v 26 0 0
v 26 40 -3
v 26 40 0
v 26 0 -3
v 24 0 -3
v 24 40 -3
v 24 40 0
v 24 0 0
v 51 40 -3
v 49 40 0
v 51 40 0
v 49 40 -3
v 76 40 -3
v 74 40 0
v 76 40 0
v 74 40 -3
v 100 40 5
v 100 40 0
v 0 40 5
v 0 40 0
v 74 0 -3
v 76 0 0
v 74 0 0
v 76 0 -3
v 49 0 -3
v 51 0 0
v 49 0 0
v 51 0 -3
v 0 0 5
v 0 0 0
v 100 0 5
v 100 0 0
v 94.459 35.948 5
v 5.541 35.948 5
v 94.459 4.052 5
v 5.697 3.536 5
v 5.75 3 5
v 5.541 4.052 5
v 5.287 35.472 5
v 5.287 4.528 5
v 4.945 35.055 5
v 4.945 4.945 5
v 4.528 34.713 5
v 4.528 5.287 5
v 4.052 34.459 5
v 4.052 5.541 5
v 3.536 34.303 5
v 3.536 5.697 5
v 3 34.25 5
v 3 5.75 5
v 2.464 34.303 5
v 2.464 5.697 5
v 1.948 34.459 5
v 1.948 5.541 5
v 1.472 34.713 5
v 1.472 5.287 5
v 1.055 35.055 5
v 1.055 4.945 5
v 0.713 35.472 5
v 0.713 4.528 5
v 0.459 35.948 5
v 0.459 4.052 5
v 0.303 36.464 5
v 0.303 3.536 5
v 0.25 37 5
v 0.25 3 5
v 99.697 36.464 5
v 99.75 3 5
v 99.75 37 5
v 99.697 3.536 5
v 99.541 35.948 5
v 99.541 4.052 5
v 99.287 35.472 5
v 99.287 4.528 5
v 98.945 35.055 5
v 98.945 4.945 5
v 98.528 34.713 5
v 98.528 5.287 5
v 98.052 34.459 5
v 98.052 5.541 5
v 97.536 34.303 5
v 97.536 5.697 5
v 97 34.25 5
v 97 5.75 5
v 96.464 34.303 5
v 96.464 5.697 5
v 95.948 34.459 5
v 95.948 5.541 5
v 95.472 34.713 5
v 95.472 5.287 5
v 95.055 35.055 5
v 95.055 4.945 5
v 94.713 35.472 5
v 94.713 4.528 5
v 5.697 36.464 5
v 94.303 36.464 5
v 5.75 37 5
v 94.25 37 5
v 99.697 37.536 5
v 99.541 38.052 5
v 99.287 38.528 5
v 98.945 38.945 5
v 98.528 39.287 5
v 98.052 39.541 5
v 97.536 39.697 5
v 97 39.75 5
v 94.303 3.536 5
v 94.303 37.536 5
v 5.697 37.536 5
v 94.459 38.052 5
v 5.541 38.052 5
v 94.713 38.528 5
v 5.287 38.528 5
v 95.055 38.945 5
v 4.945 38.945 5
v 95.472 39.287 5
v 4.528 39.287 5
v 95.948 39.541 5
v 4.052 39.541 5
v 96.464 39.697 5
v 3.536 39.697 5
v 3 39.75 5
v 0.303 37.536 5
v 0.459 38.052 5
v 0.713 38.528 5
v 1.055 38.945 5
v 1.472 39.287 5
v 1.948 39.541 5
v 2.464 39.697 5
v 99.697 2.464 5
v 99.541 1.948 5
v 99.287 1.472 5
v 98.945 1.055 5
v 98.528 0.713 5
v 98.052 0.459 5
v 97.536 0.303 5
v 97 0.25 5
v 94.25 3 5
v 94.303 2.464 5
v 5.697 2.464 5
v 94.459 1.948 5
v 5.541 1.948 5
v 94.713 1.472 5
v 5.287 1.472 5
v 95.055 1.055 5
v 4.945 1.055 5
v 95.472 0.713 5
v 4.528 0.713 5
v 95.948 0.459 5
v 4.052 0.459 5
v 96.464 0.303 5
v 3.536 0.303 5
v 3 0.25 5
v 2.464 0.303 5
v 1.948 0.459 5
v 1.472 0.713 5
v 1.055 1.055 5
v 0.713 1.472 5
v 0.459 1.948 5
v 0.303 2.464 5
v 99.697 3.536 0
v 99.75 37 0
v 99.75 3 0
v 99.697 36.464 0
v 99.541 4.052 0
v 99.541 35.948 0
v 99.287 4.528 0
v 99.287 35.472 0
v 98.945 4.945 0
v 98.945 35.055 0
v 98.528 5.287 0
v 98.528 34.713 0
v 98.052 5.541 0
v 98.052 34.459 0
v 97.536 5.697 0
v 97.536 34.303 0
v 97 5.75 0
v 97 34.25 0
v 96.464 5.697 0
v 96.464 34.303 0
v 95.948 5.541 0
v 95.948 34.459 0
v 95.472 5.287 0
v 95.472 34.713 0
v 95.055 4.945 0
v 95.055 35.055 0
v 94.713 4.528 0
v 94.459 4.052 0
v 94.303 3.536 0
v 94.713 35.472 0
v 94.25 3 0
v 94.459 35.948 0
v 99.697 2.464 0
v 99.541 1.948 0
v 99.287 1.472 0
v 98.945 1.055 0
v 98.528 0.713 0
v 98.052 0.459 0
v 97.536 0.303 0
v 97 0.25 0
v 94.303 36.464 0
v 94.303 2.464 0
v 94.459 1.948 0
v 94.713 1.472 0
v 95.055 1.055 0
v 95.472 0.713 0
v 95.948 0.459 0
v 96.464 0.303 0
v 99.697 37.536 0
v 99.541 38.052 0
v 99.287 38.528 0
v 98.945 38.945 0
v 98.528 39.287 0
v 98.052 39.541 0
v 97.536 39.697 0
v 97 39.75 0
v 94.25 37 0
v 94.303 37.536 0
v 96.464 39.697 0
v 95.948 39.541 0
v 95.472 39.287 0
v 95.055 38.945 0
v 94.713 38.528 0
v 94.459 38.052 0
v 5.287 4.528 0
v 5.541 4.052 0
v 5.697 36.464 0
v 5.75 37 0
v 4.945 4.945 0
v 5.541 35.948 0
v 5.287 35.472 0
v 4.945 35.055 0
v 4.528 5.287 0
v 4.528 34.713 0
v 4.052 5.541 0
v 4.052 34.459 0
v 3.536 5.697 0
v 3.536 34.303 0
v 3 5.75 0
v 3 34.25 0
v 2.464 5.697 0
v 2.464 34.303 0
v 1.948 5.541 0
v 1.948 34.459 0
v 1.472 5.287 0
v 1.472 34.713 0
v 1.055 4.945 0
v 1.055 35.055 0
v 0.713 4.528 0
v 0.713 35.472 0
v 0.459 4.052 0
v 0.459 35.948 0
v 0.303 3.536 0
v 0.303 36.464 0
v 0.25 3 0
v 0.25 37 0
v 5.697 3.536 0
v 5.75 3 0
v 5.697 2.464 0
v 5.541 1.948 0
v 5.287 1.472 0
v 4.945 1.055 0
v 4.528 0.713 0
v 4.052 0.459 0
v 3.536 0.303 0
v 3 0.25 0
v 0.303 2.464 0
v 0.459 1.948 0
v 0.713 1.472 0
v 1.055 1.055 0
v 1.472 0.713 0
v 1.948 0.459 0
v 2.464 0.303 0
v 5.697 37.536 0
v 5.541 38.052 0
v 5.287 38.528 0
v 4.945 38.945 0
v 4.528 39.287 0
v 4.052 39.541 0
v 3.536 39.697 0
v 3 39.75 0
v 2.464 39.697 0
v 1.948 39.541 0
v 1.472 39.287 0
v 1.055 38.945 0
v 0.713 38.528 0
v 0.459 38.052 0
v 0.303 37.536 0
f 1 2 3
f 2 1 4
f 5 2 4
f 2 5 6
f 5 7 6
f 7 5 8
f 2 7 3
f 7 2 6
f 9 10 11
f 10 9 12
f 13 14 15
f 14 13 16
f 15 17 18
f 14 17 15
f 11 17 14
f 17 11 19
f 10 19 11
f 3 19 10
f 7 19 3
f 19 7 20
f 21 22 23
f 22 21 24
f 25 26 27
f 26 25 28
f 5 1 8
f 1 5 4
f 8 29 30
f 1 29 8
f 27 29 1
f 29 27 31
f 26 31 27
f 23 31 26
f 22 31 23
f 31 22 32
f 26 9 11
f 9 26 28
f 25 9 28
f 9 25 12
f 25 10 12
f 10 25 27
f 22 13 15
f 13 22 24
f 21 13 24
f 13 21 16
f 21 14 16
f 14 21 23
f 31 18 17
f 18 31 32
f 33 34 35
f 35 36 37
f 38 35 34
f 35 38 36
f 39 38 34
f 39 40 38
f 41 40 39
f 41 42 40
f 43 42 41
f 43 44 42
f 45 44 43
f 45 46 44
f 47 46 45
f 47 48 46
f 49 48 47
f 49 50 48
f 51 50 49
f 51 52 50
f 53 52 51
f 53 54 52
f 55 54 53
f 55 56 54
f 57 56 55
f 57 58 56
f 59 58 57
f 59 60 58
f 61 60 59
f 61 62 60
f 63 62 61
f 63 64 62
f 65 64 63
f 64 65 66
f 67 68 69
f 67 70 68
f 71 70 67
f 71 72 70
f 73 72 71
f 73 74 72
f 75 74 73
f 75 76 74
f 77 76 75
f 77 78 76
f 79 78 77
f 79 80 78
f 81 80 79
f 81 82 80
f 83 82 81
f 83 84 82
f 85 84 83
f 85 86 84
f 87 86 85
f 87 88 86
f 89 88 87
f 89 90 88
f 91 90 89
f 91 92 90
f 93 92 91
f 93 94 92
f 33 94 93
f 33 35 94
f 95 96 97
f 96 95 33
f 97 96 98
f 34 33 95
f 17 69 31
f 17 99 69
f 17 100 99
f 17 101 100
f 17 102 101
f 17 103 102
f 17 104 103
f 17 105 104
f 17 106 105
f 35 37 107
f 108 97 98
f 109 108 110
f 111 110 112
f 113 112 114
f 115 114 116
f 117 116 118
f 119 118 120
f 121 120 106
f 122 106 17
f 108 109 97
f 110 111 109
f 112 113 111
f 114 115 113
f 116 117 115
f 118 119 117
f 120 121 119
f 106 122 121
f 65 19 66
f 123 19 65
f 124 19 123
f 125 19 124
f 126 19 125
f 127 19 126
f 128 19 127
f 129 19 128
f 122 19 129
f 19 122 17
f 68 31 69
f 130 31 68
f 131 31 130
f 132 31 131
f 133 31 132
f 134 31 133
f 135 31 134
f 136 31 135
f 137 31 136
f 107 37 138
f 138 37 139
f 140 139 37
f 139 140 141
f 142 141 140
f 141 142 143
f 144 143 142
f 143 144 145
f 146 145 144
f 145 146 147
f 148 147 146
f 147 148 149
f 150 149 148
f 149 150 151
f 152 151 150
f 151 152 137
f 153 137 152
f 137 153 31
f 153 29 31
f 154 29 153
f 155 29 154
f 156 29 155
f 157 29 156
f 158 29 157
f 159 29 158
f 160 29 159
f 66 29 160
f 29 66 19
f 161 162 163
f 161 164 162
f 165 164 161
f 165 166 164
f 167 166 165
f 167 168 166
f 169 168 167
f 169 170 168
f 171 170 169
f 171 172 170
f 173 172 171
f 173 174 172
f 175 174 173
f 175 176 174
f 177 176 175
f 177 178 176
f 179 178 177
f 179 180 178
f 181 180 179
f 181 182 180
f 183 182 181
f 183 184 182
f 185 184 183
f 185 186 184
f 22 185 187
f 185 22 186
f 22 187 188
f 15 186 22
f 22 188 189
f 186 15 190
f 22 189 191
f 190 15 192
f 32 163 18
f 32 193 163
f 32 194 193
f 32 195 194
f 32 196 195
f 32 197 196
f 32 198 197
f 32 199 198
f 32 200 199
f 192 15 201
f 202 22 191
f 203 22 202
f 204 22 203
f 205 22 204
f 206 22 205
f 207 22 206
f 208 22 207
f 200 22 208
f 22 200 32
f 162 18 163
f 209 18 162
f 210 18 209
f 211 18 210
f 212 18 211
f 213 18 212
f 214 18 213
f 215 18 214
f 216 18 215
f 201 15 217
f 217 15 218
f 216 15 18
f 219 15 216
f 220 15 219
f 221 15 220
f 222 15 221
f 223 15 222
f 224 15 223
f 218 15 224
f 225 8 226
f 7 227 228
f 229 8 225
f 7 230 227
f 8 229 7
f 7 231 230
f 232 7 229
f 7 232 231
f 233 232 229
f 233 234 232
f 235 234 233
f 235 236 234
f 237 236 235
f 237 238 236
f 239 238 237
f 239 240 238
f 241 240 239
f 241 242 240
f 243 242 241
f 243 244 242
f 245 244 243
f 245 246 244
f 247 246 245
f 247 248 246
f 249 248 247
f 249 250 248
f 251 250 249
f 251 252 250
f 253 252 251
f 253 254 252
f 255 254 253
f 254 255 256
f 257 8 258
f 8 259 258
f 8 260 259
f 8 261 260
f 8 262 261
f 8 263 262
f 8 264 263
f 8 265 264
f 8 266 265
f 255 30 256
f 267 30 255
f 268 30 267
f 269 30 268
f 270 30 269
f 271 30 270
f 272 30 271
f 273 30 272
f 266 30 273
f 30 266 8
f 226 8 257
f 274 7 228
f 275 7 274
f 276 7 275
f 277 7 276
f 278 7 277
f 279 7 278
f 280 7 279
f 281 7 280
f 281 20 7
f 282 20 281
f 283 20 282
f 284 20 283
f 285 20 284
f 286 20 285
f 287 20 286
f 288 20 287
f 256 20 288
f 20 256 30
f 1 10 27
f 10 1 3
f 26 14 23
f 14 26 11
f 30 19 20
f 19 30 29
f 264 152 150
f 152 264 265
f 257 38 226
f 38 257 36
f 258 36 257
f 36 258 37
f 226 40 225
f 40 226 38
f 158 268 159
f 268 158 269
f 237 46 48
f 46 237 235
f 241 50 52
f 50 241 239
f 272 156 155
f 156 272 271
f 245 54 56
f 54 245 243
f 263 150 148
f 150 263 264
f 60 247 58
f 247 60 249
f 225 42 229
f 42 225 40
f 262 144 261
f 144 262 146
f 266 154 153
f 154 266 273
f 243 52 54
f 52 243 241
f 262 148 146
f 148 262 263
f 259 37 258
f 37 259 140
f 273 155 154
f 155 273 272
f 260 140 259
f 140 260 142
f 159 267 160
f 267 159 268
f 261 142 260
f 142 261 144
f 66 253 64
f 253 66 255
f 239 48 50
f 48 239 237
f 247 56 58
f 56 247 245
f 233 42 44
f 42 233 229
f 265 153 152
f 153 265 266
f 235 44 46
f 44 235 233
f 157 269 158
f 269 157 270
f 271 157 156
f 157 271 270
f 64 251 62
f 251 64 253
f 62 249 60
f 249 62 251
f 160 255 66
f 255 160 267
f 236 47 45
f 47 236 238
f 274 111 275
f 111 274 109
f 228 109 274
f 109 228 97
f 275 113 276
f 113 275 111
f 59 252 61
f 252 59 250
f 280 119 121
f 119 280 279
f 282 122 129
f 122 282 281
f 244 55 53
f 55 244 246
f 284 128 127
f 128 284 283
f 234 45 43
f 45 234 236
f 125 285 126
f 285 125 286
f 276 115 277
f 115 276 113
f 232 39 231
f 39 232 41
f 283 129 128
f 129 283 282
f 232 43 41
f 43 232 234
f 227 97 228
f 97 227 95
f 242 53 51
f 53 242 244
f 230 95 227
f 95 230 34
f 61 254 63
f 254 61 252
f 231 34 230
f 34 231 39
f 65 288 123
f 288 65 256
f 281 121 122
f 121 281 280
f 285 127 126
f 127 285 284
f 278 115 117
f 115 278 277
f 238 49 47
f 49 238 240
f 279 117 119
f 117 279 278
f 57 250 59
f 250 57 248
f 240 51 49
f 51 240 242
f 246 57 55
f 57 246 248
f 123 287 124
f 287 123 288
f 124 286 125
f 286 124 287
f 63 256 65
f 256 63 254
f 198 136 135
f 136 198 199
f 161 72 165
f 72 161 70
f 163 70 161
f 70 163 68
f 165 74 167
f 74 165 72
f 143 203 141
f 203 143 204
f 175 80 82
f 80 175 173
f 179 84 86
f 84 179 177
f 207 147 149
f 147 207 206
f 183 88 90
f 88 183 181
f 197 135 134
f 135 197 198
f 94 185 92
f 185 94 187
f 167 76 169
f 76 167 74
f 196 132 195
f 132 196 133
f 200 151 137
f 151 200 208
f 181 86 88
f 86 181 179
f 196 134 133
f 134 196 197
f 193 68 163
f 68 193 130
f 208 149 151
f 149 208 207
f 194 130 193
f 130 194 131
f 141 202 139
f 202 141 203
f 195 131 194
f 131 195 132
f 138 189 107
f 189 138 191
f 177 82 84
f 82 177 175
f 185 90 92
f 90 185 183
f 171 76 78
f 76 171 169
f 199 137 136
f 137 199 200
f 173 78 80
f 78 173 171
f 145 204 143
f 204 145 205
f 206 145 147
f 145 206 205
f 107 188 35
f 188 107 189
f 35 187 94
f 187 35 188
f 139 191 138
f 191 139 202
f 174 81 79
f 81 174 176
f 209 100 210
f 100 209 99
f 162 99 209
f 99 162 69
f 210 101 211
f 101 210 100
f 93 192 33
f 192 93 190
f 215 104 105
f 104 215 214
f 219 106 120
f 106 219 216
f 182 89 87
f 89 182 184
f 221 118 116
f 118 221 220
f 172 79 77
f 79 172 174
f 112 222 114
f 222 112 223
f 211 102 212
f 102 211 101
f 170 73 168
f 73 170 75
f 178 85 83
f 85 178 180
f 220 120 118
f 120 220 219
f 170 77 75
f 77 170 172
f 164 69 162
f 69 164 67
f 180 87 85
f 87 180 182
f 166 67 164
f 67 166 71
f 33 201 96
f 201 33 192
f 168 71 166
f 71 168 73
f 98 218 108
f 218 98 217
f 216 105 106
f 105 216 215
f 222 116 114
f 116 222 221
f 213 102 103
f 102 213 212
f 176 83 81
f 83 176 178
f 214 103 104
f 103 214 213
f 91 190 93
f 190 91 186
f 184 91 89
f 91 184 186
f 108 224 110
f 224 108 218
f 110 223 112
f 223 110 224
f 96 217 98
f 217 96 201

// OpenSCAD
$fn = 32;

// ----------------------------------------------------------------------
// Enclosure lid: 100 x 40 x 5 mm, 4 bolt holes
// ----------------------------------------------------------------------

// --- parameters (mm) ---
length = 100;             // lid length, X
width = 40;               // lid width, Y
plate_t = 5;              // lid plate thickness
bolt_d = 5.5;             // bolt clearance
boss_lip = 3;             // bolt hole inset from the corner
sink = 1;                 // overlap of the lip and ribs into the plate
rib_n = 3;                // stiffening ribs
rib_t = 2;                // rib thickness
rib_h = 4;                // rib height below the plate

module plate() {
  cube([length, width, plate_t]);
  /* stiffening ribs under the plate */
  for (i = [1 : rib_n]) translate([length * i / (rib_n + 1) - rib_t / 2, 0, -rib_h + sink]) cube([rib_t, width - 2 * 0, rib_h]);
}

difference() {
  plate();
  /* bolt pattern matching the corner bosses */
  for (sx = [0, 1]) for (sy = [0, 1])
    translate([sx * (length - 2 * boss_lip) + boss_lip, sy * (width - 2 * boss_lip) + boss_lip, -0 - 1])
      cylinder(h = plate_t + 0 + 2, d = bolt_d);
}
